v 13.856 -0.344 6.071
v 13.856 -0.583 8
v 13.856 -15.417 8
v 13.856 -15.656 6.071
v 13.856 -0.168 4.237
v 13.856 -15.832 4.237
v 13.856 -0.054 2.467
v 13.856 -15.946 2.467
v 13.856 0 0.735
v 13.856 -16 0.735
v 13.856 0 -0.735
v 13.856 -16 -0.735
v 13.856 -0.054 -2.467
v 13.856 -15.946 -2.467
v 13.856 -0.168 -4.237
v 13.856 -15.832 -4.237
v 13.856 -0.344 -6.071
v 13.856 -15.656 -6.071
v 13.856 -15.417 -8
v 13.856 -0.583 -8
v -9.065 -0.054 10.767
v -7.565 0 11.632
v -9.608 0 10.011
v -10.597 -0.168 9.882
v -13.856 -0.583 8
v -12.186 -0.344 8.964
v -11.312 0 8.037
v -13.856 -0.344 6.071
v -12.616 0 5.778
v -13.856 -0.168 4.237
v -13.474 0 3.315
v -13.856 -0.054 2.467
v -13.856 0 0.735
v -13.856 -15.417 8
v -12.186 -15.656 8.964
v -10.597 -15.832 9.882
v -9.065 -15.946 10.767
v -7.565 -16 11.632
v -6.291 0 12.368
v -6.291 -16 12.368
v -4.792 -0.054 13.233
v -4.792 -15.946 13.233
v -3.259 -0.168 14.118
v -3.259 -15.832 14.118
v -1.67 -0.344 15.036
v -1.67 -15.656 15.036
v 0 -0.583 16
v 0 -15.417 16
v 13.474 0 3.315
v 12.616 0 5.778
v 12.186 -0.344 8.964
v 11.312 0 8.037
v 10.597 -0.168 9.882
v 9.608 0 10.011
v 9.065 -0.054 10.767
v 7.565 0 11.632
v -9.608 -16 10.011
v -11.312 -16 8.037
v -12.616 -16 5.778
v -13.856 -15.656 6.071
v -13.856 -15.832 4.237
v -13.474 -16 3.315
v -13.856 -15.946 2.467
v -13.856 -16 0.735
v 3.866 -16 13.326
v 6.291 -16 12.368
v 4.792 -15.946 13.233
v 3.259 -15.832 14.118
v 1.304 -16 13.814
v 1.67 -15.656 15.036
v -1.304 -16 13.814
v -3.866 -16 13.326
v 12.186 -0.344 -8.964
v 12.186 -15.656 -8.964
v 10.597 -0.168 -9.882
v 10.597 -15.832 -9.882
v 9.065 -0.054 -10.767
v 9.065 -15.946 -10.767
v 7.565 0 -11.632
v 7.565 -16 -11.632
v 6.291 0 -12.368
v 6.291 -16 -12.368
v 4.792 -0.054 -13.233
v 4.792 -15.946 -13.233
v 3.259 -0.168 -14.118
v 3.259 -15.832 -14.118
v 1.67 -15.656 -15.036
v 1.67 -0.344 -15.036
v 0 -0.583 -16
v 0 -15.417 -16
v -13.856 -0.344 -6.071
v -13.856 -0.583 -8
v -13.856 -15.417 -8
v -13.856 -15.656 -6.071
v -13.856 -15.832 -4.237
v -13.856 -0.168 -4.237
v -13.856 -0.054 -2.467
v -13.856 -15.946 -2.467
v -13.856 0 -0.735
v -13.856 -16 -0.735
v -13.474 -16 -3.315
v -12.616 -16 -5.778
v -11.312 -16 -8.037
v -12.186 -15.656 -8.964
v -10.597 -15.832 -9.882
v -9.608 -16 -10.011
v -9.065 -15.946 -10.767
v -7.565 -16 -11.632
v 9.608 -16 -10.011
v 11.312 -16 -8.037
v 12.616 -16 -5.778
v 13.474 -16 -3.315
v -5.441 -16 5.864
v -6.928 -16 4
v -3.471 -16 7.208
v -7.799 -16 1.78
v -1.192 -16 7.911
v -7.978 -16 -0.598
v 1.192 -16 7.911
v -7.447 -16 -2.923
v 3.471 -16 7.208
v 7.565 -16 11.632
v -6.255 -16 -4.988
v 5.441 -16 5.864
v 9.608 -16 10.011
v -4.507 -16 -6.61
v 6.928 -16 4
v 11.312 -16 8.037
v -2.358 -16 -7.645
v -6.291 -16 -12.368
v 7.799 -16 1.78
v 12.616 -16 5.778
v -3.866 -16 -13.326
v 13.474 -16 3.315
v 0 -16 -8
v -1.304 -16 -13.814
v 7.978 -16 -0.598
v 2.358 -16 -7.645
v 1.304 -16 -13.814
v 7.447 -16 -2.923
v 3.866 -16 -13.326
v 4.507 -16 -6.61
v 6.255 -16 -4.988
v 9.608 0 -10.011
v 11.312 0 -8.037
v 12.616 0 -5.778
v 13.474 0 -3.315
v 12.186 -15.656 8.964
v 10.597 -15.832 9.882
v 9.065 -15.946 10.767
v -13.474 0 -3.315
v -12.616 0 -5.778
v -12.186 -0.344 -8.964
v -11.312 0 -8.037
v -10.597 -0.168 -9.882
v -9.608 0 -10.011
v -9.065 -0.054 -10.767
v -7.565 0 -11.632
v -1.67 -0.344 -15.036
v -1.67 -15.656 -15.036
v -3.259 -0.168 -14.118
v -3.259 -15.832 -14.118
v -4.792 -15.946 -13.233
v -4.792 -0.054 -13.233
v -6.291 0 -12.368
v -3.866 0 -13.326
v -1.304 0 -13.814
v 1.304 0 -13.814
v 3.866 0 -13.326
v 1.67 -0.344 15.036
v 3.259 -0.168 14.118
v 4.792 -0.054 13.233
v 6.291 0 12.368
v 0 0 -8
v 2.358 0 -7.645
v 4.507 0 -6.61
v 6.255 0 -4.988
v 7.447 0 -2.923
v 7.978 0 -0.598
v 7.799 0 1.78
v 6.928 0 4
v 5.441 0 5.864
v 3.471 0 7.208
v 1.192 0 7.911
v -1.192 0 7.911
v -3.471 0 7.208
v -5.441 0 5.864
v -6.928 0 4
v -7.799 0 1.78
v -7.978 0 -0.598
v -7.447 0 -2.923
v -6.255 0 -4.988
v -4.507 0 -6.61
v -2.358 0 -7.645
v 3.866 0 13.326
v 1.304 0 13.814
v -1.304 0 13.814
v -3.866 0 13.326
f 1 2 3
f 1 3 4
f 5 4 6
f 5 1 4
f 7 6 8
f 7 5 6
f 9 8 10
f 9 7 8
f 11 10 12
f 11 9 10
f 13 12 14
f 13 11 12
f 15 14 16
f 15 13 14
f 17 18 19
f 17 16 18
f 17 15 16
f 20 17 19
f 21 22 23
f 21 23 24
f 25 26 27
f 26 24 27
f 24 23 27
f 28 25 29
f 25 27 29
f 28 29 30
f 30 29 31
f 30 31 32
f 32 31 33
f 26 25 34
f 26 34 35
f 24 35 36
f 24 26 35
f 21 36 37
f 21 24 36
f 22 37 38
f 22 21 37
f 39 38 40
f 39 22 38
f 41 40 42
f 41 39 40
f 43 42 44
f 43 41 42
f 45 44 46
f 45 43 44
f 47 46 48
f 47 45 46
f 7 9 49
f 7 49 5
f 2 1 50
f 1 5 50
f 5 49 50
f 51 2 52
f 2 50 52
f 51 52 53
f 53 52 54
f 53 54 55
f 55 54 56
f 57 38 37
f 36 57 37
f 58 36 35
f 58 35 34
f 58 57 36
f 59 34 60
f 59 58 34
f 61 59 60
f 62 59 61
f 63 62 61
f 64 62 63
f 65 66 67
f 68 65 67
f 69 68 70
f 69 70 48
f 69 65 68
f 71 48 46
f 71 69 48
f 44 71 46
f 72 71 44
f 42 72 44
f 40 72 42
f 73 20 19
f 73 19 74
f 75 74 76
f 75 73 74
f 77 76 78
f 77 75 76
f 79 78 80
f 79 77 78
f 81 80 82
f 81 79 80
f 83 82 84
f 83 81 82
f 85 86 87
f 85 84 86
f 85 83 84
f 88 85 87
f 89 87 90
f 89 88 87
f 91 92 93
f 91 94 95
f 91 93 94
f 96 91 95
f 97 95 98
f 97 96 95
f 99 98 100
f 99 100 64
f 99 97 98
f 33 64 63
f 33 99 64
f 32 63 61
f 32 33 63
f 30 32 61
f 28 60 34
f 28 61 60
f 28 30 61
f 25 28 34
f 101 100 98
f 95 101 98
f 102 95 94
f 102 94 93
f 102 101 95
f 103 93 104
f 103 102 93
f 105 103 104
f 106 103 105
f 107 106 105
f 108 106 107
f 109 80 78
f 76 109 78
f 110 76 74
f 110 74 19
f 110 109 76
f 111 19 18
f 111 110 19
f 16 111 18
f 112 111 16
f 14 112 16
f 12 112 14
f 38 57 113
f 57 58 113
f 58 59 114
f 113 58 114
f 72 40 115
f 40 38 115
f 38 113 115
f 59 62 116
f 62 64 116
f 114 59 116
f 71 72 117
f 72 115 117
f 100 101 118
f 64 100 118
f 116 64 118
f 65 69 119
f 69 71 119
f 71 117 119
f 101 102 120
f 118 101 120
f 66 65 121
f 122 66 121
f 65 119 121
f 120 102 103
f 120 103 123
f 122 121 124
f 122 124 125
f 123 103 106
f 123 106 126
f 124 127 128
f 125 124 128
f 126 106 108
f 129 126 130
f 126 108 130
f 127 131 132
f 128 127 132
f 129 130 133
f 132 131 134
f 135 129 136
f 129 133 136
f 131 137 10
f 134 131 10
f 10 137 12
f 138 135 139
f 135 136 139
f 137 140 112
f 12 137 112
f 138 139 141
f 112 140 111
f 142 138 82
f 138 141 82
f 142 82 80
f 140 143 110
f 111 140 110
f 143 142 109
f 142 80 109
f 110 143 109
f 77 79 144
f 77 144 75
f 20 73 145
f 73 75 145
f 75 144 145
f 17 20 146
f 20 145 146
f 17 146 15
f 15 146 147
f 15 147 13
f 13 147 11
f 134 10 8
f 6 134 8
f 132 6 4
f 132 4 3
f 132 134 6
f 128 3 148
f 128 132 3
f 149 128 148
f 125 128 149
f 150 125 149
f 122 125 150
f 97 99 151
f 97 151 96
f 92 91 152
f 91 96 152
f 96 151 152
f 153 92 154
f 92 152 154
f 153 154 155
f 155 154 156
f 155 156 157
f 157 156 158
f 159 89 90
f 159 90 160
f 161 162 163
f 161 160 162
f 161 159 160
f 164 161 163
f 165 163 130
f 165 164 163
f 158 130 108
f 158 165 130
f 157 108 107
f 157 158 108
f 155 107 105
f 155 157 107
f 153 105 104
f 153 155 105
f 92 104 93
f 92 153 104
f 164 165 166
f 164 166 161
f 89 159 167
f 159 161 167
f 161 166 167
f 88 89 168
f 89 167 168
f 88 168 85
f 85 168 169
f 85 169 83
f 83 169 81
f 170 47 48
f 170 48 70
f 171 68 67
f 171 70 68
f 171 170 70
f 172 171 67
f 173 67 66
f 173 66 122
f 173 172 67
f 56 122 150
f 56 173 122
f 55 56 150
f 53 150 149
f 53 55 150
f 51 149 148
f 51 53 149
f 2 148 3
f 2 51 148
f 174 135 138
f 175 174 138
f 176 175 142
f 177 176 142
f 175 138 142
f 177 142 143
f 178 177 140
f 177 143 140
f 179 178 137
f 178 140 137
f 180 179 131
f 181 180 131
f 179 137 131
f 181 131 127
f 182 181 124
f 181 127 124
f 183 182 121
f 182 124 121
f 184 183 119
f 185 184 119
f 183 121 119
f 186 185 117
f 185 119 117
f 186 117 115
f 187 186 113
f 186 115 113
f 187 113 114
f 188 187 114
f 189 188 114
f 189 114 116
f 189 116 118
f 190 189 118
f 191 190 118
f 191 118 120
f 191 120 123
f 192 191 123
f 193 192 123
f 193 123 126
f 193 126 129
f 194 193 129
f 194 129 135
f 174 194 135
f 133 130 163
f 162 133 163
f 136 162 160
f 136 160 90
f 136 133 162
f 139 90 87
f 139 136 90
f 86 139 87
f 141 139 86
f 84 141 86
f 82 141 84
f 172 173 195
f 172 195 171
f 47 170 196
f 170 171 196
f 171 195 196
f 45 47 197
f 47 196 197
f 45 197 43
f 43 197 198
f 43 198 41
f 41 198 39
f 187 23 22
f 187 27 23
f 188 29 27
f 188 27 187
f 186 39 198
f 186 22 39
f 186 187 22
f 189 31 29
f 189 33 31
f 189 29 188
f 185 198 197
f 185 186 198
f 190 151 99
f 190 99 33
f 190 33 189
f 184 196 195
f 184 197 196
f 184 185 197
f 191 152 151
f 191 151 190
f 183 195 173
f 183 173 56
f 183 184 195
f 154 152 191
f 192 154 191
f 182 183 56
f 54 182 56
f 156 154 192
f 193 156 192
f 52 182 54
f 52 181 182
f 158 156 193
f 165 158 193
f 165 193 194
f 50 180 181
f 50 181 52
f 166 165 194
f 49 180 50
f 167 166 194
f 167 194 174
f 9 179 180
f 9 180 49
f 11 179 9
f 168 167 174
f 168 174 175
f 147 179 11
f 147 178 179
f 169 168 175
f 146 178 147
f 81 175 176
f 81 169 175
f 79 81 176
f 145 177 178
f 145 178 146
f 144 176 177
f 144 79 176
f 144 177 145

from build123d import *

# Parameters (mm, degrees)
BOSS_EXTRUDE2_DEPTH = 16
SKETCH9_R           = 8
CUT_EXTRUDE3_DEPTH  = 64


with BuildPart() as part:
    # Sketch4 → Boss-Extrude2 (new body)
    with BuildSketch(Plane(origin=(0, 0, 0), x_dir=(1, 0, 0), z_dir=(0, 1, 0))):
        Polygon((0, -16), (13.856406461, -8), (13.856406461, 8), (0, 16), (-13.856406461, 8), (-13.856406461, -8), align=None)
    extrude(amount=-BOSS_EXTRUDE2_DEPTH)

    # Sketch5 → Cut-Revolve2 (revolve, cut)
    with BuildSketch(Plane.XY):
        Polygon((-13.875900938, 0), (-18.013042907, 0), (-18.013042907, -1.135273282), align=None)
    cut_revolve2 = revolve(axis=Axis((0, 7.032369226, 0), (0, -1, 0)), mode=Mode.SUBTRACT)

    # Sketch9 → Cut-Extrude3 (cut)
    with BuildSketch(Plane.XZ.offset(16)):
        with Locations(Location((0, 0, 0), (0, 0, 270))):
            Circle(SKETCH9_R)
    extrude(amount=-CUT_EXTRUDE3_DEPTH, mode=Mode.SUBTRACT)

    # Mirror1: Cut-Revolve2 across plane
    add(cut_revolve2.mirror(Plane.ZX.offset(-8)), mode=Mode.SUBTRACT)


solid = part.part
